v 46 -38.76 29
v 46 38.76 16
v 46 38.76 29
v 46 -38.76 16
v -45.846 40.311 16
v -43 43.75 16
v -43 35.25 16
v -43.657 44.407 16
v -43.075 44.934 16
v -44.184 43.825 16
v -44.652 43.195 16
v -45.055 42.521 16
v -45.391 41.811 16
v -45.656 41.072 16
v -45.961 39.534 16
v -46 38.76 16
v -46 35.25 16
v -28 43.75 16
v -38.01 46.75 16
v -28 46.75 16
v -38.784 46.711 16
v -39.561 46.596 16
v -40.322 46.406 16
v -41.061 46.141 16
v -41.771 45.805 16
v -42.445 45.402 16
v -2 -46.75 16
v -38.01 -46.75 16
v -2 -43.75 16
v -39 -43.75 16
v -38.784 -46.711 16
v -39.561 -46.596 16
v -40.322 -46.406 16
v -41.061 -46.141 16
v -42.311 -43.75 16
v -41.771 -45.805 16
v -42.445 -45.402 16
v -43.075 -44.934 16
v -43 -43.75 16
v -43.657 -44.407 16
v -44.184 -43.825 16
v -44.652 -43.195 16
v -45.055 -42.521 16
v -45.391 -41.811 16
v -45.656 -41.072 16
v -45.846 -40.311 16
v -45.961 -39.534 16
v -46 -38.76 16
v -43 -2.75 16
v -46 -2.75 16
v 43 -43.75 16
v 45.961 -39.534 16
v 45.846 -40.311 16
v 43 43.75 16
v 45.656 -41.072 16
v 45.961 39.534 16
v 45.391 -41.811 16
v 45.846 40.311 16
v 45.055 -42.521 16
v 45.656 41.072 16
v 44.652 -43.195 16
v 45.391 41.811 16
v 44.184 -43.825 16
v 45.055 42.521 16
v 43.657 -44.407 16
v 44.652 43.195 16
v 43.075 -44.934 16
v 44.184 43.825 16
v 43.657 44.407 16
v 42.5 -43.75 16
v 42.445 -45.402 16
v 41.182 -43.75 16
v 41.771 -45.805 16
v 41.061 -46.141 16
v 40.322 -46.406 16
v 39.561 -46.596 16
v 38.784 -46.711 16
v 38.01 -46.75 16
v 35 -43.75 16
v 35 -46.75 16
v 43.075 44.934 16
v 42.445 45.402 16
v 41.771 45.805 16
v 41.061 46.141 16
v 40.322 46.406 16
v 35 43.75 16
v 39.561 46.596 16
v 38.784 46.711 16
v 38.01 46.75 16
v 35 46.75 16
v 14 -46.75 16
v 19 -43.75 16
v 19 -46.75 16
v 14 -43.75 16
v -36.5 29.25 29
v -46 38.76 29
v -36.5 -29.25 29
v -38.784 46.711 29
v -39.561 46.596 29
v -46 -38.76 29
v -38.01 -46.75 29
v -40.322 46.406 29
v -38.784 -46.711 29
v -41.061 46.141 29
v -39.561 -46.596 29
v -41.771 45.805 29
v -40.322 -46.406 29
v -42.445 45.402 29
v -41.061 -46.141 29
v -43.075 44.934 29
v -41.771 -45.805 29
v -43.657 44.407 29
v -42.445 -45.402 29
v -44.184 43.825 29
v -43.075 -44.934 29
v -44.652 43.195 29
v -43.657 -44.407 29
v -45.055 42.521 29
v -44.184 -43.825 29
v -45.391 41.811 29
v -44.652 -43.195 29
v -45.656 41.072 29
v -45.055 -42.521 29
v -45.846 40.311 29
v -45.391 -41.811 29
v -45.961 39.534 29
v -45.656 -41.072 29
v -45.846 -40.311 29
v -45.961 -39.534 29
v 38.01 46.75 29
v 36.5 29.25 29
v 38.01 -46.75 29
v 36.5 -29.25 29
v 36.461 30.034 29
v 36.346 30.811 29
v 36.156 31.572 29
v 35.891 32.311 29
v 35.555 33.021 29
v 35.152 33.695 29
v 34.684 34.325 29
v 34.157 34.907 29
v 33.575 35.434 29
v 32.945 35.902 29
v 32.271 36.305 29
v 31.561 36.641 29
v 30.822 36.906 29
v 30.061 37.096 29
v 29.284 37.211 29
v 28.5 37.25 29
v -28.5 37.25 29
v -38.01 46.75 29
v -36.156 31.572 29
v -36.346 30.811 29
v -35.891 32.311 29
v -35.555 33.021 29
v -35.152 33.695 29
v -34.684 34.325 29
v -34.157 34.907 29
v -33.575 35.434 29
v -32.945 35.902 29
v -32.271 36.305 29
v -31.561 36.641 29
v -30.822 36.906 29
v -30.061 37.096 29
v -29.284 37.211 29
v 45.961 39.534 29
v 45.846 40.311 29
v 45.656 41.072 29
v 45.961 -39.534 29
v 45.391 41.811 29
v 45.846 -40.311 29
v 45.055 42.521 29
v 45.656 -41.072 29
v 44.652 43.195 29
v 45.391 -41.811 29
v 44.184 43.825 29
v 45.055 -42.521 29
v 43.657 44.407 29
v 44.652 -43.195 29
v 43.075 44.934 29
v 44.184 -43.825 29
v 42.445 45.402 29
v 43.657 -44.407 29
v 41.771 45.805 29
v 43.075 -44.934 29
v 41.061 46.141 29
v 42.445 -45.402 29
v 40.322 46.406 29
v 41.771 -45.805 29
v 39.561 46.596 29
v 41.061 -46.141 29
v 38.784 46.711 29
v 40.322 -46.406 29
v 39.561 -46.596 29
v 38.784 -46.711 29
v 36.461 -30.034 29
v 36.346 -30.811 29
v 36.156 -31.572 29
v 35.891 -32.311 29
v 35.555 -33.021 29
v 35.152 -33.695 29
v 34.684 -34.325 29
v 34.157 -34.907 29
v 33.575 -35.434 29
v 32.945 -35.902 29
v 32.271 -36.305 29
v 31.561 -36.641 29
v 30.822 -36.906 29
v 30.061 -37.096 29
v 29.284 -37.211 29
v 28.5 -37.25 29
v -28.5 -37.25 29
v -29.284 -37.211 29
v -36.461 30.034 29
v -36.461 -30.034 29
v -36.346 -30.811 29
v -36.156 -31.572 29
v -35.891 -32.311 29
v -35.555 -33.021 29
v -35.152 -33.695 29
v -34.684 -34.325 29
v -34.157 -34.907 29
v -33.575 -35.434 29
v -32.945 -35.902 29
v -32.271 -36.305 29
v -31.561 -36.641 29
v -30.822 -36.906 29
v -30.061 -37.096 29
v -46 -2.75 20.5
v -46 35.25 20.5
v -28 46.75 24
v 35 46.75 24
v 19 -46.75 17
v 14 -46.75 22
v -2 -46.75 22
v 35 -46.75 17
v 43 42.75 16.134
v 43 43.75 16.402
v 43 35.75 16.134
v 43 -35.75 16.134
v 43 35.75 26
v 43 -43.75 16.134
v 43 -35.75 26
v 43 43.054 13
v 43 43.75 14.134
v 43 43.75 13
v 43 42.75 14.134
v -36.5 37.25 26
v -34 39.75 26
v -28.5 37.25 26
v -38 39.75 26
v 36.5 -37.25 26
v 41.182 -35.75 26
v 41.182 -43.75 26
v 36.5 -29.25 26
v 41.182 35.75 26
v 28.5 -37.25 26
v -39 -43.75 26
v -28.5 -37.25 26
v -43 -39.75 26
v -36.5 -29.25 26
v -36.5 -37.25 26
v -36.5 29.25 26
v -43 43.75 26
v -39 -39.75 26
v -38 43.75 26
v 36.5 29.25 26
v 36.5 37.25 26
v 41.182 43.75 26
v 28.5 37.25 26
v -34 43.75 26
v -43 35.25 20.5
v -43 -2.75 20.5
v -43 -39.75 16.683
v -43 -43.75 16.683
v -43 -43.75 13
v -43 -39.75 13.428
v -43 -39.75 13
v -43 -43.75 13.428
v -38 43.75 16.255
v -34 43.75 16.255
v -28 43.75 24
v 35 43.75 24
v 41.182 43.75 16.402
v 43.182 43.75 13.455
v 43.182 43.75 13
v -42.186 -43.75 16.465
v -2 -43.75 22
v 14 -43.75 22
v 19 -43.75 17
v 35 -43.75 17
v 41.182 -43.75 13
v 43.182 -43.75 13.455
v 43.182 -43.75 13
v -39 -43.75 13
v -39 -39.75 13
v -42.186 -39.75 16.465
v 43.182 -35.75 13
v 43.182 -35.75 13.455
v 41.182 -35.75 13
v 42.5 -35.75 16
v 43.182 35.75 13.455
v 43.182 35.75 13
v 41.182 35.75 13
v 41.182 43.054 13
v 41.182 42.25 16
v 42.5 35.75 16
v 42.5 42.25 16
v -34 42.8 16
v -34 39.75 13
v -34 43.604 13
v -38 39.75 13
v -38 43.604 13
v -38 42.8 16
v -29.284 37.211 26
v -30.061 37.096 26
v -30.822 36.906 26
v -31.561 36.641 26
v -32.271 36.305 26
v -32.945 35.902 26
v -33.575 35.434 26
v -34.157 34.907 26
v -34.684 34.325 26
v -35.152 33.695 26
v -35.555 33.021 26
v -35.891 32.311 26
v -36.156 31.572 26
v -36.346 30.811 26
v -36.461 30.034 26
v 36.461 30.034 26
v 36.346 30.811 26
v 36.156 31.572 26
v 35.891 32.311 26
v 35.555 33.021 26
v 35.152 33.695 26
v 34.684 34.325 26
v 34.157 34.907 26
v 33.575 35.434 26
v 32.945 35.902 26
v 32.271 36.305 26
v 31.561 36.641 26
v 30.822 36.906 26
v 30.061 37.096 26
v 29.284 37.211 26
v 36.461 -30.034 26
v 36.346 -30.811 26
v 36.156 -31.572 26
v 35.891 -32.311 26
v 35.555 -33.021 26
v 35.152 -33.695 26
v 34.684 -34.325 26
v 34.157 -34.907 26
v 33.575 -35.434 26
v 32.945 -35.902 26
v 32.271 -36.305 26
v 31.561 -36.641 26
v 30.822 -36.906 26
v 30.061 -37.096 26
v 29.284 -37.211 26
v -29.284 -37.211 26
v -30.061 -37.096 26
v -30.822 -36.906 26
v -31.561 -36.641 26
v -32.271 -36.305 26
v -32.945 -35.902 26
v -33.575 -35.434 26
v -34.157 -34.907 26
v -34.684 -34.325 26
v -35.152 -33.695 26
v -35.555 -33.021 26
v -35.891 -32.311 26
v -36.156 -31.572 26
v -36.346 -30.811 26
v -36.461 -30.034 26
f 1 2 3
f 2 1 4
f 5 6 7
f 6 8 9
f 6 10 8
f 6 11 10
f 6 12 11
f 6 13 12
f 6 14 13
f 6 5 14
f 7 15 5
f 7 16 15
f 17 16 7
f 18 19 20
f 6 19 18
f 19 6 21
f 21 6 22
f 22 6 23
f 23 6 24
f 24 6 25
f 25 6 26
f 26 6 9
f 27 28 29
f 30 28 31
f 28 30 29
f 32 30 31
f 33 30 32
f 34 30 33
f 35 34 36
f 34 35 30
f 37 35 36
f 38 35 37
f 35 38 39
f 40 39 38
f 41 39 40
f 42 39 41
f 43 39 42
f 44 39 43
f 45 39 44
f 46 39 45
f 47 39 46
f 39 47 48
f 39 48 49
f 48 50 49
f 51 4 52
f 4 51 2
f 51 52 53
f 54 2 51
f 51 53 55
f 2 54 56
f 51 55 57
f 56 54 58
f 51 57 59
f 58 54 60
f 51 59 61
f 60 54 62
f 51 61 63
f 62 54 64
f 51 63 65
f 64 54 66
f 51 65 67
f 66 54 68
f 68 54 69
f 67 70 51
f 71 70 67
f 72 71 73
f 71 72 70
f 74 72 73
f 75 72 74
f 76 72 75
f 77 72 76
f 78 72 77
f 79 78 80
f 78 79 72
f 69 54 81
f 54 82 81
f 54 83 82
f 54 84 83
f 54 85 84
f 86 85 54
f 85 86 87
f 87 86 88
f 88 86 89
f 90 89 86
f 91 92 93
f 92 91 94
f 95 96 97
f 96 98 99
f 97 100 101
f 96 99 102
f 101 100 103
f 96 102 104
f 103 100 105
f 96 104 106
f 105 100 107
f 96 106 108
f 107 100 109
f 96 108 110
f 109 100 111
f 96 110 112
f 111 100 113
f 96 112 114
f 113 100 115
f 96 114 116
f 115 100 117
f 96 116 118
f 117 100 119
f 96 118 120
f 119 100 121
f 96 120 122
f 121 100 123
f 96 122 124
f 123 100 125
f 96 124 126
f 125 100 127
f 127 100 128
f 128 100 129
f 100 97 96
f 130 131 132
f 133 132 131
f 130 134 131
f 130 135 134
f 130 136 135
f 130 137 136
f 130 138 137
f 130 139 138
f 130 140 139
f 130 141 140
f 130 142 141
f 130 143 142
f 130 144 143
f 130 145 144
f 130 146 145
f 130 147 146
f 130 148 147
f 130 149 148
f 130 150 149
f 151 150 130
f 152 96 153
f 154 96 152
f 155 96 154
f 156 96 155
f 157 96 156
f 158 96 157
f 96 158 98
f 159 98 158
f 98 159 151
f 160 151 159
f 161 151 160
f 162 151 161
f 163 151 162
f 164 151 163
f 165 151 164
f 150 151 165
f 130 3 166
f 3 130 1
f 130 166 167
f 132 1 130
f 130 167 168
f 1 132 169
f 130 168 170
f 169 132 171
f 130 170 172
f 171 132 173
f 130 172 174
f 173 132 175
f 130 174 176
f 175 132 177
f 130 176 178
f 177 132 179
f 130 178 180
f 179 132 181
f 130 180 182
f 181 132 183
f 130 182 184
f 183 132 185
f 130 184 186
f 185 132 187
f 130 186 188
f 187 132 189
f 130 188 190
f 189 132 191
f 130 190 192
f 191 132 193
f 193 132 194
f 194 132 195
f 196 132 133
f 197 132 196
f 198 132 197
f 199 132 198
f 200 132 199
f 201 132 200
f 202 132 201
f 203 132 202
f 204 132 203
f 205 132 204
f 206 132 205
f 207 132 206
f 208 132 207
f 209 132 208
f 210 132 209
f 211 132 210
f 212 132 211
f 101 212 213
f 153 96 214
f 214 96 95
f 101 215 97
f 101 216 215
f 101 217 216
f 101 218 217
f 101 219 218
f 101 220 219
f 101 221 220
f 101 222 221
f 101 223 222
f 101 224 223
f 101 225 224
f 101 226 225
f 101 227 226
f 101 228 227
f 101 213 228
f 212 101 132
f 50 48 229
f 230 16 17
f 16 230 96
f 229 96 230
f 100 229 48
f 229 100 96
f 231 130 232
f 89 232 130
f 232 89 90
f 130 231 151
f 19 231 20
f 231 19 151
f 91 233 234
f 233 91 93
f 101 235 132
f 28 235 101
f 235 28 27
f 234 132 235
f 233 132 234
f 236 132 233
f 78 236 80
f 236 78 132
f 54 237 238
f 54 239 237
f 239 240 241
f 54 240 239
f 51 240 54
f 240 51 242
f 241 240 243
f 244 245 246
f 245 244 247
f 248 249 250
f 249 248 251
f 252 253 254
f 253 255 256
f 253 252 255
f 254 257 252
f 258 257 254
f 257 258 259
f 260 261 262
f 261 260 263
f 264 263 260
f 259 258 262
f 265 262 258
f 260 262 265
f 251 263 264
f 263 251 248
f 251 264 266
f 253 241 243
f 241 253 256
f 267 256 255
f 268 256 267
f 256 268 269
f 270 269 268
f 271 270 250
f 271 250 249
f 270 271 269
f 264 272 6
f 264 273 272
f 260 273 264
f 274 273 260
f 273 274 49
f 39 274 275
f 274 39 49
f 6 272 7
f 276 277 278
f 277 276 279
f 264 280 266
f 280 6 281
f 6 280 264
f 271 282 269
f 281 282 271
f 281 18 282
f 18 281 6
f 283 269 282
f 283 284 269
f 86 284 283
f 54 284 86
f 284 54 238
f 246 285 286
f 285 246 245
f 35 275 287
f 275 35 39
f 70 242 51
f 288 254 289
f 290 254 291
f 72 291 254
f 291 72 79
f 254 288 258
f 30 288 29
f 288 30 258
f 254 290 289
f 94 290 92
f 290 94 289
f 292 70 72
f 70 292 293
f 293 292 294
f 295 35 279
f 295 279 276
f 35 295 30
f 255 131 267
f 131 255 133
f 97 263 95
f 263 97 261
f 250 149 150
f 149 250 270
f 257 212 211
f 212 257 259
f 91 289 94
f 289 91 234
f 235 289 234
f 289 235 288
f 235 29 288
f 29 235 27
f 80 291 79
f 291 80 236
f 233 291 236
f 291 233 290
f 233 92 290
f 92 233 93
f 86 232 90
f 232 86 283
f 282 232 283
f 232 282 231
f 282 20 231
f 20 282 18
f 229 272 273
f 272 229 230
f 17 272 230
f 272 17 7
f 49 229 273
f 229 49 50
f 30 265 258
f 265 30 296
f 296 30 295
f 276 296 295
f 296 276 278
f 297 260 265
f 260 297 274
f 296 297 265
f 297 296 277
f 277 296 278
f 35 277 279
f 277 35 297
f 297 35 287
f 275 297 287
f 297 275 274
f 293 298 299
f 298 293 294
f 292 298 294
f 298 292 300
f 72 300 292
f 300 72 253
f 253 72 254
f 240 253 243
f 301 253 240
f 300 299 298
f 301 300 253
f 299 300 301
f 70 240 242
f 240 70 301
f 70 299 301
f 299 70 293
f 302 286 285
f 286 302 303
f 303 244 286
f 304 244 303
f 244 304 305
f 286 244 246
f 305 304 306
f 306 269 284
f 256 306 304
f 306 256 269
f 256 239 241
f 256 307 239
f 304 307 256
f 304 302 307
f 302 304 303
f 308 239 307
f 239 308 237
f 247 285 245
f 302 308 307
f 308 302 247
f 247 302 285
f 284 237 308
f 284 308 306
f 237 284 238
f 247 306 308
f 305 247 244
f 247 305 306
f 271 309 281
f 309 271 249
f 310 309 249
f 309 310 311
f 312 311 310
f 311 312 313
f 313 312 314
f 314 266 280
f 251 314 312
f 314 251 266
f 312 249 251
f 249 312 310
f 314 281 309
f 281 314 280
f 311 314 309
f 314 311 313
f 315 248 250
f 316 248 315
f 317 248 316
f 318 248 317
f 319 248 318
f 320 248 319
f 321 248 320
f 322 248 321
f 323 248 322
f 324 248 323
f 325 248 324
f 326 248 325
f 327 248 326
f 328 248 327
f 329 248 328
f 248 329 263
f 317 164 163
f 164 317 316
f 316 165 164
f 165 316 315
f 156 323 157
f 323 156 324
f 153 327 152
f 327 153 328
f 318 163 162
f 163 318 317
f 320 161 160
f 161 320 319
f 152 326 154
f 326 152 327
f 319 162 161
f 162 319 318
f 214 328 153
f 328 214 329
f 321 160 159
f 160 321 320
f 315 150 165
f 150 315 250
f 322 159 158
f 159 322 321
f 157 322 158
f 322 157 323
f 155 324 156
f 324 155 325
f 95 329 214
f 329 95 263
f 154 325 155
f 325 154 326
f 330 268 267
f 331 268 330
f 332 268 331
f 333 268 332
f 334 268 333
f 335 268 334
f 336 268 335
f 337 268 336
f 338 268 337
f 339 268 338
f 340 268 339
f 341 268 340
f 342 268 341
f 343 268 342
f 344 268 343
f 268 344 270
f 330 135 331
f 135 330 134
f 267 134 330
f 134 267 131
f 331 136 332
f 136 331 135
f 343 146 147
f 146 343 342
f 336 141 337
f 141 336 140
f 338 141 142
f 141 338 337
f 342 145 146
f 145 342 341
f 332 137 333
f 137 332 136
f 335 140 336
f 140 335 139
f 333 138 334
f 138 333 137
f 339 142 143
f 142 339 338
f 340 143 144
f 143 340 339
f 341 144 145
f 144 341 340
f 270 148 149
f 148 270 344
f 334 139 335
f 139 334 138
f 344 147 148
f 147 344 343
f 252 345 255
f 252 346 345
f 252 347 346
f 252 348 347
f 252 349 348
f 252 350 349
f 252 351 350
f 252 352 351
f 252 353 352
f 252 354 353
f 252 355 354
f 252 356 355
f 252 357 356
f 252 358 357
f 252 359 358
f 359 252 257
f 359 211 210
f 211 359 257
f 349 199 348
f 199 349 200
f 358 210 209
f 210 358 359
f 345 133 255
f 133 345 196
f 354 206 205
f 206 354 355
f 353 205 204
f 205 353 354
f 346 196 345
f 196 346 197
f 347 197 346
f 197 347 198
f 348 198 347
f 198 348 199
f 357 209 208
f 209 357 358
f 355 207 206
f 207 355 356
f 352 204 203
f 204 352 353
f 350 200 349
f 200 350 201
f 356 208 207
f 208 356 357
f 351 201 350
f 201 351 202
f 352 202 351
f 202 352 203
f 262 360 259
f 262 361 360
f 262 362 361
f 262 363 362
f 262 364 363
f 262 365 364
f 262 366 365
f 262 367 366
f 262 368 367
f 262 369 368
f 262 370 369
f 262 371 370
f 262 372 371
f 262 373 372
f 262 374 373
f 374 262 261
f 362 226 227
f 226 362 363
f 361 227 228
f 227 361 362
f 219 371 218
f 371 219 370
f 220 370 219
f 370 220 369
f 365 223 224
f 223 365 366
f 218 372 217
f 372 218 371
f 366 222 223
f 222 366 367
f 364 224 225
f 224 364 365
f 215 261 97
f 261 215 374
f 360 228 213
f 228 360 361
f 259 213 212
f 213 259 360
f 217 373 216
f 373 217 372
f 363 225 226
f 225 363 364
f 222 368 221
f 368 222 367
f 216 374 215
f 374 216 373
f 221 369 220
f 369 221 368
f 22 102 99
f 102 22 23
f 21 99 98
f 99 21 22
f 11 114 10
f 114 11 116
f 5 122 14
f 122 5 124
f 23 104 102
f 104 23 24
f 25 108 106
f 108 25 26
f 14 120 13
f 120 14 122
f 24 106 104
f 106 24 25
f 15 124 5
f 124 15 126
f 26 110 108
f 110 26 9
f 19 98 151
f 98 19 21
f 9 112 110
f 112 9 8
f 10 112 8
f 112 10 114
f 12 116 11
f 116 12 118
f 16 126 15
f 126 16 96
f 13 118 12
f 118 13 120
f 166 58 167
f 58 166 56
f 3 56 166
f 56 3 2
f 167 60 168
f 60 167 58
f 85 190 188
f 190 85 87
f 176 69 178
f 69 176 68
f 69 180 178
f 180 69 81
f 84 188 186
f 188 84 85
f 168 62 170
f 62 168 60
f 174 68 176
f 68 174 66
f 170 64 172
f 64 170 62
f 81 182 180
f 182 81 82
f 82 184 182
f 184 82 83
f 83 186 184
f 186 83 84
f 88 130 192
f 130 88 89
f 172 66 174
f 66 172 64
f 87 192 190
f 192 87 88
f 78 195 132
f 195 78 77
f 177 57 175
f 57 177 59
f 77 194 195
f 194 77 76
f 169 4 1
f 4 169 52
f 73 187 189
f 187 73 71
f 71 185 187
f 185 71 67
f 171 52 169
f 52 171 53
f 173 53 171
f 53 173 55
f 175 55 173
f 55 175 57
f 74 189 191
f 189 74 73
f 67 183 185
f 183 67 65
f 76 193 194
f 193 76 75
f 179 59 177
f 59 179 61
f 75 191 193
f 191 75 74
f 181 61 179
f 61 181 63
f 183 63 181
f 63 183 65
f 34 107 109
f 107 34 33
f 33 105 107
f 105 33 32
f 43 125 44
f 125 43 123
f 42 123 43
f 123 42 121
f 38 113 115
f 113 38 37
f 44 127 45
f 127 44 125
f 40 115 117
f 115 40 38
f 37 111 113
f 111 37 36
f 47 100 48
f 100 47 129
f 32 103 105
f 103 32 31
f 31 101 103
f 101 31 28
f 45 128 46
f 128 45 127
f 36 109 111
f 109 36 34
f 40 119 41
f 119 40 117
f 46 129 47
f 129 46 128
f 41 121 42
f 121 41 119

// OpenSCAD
// Cover for beagleboardbox, (c) 2010,2011 - Koen Kooi, licensed under CC-BY-SA

// Box for beagleboard, (c) 2010 - Koen Kooi, licensed under CC-BY-SA

// lenght of PCB
inside_length = 87.5;

// width of PCB
inside_w = 86;

// outside wall thickness
edge_thickness = 3;
stud_height = edge_thickness;

// Set this to zero have a 'coaster' instead of a box
// The '7' value is chosen to stick just above the hdmi, musb and audio connectors
extra_height = 8;

// stud is inside the wall but aligned to the bottom, 
// so its stud_size x stud_size x (stud_height - edge_thickness) big
stud_size = 4;
bezel_width = 6.5;

pcb_thickness = 2;

// Round the inside and outside corners
use_rounded_corners = 1; // 0,1
//import_stl("beaglebox-xm-logo.stl");

inside_corner_radius = 8;
corner_radius = 8;

box_width = inside_w + (edge_thickness * 2); 
box_length = inside_length + (edge_thickness * 2);
box_height = stud_height + pcb_thickness + extra_height;

mirror([0,0,1]) translate(v = [ -box_width / 2, -box_length / 2, (-box_height * 2) -3]) {   
  if(use_rounded_corners == 1) {
    roundedbox(box_width, box_length, box_height, edge_thickness, bezel_width, stud_size);
  } else {
    plainbox(box_width, box_length, box_height, edge_thickness, bezel_width, stud_size);
  }
}


module plainbox(box_width, box_length, box_height, edge_thickness, bezel_width, stud_size) {
  union() {
    difference() {
      //outside
      cube([box_width, box_length, box_height]);
      //inside
      translate(v = [edge_thickness, edge_thickness, edge_thickness]) {  
        cube([inside_w, inside_length, box_height]);
      }
      translate(v = [bezel_width + edge_thickness, bezel_width + edge_thickness, -edge_thickness]) {  
        cube([inside_w - 2 * bezel_width, inside_length - 2 * bezel_width, box_height]);
      }
      //S-video 16mm, 41mm corner offset
      translate(v = [41 + edge_thickness, -0.01, stud_height + pcb_thickness + 2]) {
        cube([16, edge_thickness + 0.02, extra_height + 0.01], center=false);
      }
      //DVI 16mm, 8 mm corner offset
      translate(v = [(86 - 8 - 16)+ edge_thickness, -0.01, stud_height + pcb_thickness + 7]) {
        cube([16, edge_thickness + 0.02, extra_height + 0.01], center=false);
      }
      //eth + usb: 63mm long, 15mm corner offset
      translate(v = [15 + edge_thickness, box_length - edge_thickness - 0.01, stud_height + pcb_thickness ]) {
        cube([63, edge_thickness + 0.02, extra_height + 0.01 + 2], center=false);
      }
      //power + otg: 38mm long, 41mm corner offset
      translate(v = [-0.01, 41 + edge_thickness, stud_height + pcb_thickness + 3.5]) {
        cube([edge_thickness + 0.02, 38, extra_height + 0.01], center=false);
      }
    } // end difference
    //support studs

	difference() {
		translate(v = [edge_thickness, edge_thickness, 0]) {
			cube([stud_size, stud_size, stud_height + box_height], center = false);
		}
		//clip
		translate(v = [edge_thickness - stud_size + 0.95, edge_thickness, box_height -1.5 ]) {
			rotate(a=[0,-15,0]) cube([stud_size, stud_size * 1.1, stud_size], center = false);
		}
	}

	difference() {
 	   translate(v = [box_width - stud_size/2.2 - edge_thickness, edge_thickness, 0]) {
	      cube([stud_size/2, stud_size * 2, stud_height + box_height], center = false);
	    }
		//clip
		#translate(v = [box_width - edge_thickness -0.5, edge_thickness, box_height]) {
			rotate(a=[0,15,0]) cube([stud_size, stud_size * 2.1, stud_size], center = false);
	    }	
	}

	difference() {
	    translate(v = [box_width - stud_size/2.2 - edge_thickness, box_length - stud_size * 2- edge_thickness, 0]) {
	      cube([stud_size/2, stud_size * 2, stud_height + box_height], center = false);
	    }
		// clip
	    #translate(v = [box_width - edge_thickness -0.5 , box_length - stud_size *2 - edge_thickness, box_height]) {
	      rotate(a=[0,15,0]) cube([stud_size, stud_size * 2.1, stud_size], center = false);
		}
		translate(v = [box_width - edge_thickness - stud_size, box_length - edge_thickness - 1.5, box_height]) {
			rotate(a=[-15,0,0]) cube([stud_size, stud_size * 1.1, stud_size], center = false);
		}
	}

	//move stud above serial header
	difference() {
		translate(v = [edge_thickness + 5, box_length - stud_size - edge_thickness , 0]) {
			cube([stud_size, stud_size, stud_height+ box_height], center = false);
		}
		//clip
		translate(v = [edge_thickness + 5, box_length - edge_thickness - 0.95, box_height]) {
			rotate(a=[-15,0,0]) cube([stud_size, stud_size * 1.1, stud_size], center = false);
		}
	}



  } // end union
}

module roundedbox(box_width, box_length, box_height, edge_thickness, bezel_width, stud_size) {
  difference() {
    union() {
      plainbox(box_width, box_length, box_height, edge_thickness, bezel_width, stud_size);
  
        //rounded corner topleft
        translate(v = [edge_thickness + bezel_width, box_length - edge_thickness - bezel_width, 0]) {
          difference() {
            translate(v=[0,-inside_corner_radius,0]) {
              cube([inside_corner_radius,inside_corner_radius,edge_thickness]);
            }
            translate(v=[inside_corner_radius, -inside_corner_radius, -edge_thickness]) {
              cylinder(r=inside_corner_radius, h=3*edge_thickness, $fn=64);
            }
          }
        }
        //rounded corner topright
        translate(v = [box_width - edge_thickness - bezel_width, box_length - edge_thickness - bezel_width, 0]) {
          difference() {
            translate(v=[-inside_corner_radius,-inside_corner_radius,0]) {
              cube([inside_corner_radius,inside_corner_radius,edge_thickness]);
            }
            translate(v=[-inside_corner_radius, -inside_corner_radius, -edge_thickness]) {
              cylinder(r=inside_corner_radius, h=3*edge_thickness, $fn=64);
            }
          }
        }
        //rounded corner bottomright
        translate(v = [box_width - edge_thickness - bezel_width, edge_thickness + bezel_width, 0]) {
          difference() {
            translate(v=[-inside_corner_radius,0,0]) {
              cube([inside_corner_radius,inside_corner_radius,edge_thickness]);
            }
            translate(v=[-inside_corner_radius, inside_corner_radius, -edge_thickness]) {
              cylinder(r=inside_corner_radius, h=3*edge_thickness, $fn=64);
            }
          }
        }
        //rounded corner bottomleft
        translate(v = [edge_thickness + bezel_width, edge_thickness + bezel_width, 0]) {
          difference() {
            translate(v=[0,0,0]) {
              cube([inside_corner_radius,inside_corner_radius,edge_thickness]);
            }
            translate(v=[inside_corner_radius, inside_corner_radius, -edge_thickness]) {
              cylinder(r=inside_corner_radius, h=3*edge_thickness, $fn=64);
            }
          }
        }
    } //end union

    //rounded corner topleft
    translate(v = [0, box_length, 0]) {
      difference() {
        translate(v=[0 - 0.01,-corner_radius + 0.01, -0.5 * box_height]) {
          cube([corner_radius,corner_radius,2*box_height]);
        }
        translate(v=[corner_radius, -corner_radius, -0.5 * box_height]) {
          cylinder(r=corner_radius, h=2*box_height, $fn=64);
        }
      }
    }
    //rounded corner topright
    translate(v = [box_width, box_length, 0]) {
      difference() {
        translate(v=[-corner_radius + 0.01,-corner_radius + 0.01, -0.5 * box_height]) {
          cube([corner_radius,corner_radius,2*box_height]);
        }
        translate(v=[-corner_radius, -corner_radius, -0.5 * box_height]) {
          cylinder(r=corner_radius, h=2*box_height, $fn=64);
        }
      }
    }
    //rounded corner bottomright
    translate(v = [box_width, 0, 0]) {
      difference() {
        translate(v=[-corner_radius + 0.01,0 - 0.01, -0.5 * box_height]) {
          cube([corner_radius,corner_radius,2*box_height]);
        }
        translate(v=[-corner_radius, corner_radius, -0.5 * box_height]) {
          cylinder(r=corner_radius, h=2*box_height, $fn=64);
        }
      }
    }
    //rounded corner bottomleft
    translate(v = [0, 0, 0]) {
      difference() {
        translate(v=[0-0.01, -0.01, -0.5 * box_height]) {
          cube([corner_radius ,corner_radius,2*box_height]);
        }
        translate(v=[corner_radius, corner_radius, -0.5 * box_height]) {
          cylinder(r=corner_radius, h=2*box_height, $fn=64);
        }
      }
    }
  } //end difference
}
